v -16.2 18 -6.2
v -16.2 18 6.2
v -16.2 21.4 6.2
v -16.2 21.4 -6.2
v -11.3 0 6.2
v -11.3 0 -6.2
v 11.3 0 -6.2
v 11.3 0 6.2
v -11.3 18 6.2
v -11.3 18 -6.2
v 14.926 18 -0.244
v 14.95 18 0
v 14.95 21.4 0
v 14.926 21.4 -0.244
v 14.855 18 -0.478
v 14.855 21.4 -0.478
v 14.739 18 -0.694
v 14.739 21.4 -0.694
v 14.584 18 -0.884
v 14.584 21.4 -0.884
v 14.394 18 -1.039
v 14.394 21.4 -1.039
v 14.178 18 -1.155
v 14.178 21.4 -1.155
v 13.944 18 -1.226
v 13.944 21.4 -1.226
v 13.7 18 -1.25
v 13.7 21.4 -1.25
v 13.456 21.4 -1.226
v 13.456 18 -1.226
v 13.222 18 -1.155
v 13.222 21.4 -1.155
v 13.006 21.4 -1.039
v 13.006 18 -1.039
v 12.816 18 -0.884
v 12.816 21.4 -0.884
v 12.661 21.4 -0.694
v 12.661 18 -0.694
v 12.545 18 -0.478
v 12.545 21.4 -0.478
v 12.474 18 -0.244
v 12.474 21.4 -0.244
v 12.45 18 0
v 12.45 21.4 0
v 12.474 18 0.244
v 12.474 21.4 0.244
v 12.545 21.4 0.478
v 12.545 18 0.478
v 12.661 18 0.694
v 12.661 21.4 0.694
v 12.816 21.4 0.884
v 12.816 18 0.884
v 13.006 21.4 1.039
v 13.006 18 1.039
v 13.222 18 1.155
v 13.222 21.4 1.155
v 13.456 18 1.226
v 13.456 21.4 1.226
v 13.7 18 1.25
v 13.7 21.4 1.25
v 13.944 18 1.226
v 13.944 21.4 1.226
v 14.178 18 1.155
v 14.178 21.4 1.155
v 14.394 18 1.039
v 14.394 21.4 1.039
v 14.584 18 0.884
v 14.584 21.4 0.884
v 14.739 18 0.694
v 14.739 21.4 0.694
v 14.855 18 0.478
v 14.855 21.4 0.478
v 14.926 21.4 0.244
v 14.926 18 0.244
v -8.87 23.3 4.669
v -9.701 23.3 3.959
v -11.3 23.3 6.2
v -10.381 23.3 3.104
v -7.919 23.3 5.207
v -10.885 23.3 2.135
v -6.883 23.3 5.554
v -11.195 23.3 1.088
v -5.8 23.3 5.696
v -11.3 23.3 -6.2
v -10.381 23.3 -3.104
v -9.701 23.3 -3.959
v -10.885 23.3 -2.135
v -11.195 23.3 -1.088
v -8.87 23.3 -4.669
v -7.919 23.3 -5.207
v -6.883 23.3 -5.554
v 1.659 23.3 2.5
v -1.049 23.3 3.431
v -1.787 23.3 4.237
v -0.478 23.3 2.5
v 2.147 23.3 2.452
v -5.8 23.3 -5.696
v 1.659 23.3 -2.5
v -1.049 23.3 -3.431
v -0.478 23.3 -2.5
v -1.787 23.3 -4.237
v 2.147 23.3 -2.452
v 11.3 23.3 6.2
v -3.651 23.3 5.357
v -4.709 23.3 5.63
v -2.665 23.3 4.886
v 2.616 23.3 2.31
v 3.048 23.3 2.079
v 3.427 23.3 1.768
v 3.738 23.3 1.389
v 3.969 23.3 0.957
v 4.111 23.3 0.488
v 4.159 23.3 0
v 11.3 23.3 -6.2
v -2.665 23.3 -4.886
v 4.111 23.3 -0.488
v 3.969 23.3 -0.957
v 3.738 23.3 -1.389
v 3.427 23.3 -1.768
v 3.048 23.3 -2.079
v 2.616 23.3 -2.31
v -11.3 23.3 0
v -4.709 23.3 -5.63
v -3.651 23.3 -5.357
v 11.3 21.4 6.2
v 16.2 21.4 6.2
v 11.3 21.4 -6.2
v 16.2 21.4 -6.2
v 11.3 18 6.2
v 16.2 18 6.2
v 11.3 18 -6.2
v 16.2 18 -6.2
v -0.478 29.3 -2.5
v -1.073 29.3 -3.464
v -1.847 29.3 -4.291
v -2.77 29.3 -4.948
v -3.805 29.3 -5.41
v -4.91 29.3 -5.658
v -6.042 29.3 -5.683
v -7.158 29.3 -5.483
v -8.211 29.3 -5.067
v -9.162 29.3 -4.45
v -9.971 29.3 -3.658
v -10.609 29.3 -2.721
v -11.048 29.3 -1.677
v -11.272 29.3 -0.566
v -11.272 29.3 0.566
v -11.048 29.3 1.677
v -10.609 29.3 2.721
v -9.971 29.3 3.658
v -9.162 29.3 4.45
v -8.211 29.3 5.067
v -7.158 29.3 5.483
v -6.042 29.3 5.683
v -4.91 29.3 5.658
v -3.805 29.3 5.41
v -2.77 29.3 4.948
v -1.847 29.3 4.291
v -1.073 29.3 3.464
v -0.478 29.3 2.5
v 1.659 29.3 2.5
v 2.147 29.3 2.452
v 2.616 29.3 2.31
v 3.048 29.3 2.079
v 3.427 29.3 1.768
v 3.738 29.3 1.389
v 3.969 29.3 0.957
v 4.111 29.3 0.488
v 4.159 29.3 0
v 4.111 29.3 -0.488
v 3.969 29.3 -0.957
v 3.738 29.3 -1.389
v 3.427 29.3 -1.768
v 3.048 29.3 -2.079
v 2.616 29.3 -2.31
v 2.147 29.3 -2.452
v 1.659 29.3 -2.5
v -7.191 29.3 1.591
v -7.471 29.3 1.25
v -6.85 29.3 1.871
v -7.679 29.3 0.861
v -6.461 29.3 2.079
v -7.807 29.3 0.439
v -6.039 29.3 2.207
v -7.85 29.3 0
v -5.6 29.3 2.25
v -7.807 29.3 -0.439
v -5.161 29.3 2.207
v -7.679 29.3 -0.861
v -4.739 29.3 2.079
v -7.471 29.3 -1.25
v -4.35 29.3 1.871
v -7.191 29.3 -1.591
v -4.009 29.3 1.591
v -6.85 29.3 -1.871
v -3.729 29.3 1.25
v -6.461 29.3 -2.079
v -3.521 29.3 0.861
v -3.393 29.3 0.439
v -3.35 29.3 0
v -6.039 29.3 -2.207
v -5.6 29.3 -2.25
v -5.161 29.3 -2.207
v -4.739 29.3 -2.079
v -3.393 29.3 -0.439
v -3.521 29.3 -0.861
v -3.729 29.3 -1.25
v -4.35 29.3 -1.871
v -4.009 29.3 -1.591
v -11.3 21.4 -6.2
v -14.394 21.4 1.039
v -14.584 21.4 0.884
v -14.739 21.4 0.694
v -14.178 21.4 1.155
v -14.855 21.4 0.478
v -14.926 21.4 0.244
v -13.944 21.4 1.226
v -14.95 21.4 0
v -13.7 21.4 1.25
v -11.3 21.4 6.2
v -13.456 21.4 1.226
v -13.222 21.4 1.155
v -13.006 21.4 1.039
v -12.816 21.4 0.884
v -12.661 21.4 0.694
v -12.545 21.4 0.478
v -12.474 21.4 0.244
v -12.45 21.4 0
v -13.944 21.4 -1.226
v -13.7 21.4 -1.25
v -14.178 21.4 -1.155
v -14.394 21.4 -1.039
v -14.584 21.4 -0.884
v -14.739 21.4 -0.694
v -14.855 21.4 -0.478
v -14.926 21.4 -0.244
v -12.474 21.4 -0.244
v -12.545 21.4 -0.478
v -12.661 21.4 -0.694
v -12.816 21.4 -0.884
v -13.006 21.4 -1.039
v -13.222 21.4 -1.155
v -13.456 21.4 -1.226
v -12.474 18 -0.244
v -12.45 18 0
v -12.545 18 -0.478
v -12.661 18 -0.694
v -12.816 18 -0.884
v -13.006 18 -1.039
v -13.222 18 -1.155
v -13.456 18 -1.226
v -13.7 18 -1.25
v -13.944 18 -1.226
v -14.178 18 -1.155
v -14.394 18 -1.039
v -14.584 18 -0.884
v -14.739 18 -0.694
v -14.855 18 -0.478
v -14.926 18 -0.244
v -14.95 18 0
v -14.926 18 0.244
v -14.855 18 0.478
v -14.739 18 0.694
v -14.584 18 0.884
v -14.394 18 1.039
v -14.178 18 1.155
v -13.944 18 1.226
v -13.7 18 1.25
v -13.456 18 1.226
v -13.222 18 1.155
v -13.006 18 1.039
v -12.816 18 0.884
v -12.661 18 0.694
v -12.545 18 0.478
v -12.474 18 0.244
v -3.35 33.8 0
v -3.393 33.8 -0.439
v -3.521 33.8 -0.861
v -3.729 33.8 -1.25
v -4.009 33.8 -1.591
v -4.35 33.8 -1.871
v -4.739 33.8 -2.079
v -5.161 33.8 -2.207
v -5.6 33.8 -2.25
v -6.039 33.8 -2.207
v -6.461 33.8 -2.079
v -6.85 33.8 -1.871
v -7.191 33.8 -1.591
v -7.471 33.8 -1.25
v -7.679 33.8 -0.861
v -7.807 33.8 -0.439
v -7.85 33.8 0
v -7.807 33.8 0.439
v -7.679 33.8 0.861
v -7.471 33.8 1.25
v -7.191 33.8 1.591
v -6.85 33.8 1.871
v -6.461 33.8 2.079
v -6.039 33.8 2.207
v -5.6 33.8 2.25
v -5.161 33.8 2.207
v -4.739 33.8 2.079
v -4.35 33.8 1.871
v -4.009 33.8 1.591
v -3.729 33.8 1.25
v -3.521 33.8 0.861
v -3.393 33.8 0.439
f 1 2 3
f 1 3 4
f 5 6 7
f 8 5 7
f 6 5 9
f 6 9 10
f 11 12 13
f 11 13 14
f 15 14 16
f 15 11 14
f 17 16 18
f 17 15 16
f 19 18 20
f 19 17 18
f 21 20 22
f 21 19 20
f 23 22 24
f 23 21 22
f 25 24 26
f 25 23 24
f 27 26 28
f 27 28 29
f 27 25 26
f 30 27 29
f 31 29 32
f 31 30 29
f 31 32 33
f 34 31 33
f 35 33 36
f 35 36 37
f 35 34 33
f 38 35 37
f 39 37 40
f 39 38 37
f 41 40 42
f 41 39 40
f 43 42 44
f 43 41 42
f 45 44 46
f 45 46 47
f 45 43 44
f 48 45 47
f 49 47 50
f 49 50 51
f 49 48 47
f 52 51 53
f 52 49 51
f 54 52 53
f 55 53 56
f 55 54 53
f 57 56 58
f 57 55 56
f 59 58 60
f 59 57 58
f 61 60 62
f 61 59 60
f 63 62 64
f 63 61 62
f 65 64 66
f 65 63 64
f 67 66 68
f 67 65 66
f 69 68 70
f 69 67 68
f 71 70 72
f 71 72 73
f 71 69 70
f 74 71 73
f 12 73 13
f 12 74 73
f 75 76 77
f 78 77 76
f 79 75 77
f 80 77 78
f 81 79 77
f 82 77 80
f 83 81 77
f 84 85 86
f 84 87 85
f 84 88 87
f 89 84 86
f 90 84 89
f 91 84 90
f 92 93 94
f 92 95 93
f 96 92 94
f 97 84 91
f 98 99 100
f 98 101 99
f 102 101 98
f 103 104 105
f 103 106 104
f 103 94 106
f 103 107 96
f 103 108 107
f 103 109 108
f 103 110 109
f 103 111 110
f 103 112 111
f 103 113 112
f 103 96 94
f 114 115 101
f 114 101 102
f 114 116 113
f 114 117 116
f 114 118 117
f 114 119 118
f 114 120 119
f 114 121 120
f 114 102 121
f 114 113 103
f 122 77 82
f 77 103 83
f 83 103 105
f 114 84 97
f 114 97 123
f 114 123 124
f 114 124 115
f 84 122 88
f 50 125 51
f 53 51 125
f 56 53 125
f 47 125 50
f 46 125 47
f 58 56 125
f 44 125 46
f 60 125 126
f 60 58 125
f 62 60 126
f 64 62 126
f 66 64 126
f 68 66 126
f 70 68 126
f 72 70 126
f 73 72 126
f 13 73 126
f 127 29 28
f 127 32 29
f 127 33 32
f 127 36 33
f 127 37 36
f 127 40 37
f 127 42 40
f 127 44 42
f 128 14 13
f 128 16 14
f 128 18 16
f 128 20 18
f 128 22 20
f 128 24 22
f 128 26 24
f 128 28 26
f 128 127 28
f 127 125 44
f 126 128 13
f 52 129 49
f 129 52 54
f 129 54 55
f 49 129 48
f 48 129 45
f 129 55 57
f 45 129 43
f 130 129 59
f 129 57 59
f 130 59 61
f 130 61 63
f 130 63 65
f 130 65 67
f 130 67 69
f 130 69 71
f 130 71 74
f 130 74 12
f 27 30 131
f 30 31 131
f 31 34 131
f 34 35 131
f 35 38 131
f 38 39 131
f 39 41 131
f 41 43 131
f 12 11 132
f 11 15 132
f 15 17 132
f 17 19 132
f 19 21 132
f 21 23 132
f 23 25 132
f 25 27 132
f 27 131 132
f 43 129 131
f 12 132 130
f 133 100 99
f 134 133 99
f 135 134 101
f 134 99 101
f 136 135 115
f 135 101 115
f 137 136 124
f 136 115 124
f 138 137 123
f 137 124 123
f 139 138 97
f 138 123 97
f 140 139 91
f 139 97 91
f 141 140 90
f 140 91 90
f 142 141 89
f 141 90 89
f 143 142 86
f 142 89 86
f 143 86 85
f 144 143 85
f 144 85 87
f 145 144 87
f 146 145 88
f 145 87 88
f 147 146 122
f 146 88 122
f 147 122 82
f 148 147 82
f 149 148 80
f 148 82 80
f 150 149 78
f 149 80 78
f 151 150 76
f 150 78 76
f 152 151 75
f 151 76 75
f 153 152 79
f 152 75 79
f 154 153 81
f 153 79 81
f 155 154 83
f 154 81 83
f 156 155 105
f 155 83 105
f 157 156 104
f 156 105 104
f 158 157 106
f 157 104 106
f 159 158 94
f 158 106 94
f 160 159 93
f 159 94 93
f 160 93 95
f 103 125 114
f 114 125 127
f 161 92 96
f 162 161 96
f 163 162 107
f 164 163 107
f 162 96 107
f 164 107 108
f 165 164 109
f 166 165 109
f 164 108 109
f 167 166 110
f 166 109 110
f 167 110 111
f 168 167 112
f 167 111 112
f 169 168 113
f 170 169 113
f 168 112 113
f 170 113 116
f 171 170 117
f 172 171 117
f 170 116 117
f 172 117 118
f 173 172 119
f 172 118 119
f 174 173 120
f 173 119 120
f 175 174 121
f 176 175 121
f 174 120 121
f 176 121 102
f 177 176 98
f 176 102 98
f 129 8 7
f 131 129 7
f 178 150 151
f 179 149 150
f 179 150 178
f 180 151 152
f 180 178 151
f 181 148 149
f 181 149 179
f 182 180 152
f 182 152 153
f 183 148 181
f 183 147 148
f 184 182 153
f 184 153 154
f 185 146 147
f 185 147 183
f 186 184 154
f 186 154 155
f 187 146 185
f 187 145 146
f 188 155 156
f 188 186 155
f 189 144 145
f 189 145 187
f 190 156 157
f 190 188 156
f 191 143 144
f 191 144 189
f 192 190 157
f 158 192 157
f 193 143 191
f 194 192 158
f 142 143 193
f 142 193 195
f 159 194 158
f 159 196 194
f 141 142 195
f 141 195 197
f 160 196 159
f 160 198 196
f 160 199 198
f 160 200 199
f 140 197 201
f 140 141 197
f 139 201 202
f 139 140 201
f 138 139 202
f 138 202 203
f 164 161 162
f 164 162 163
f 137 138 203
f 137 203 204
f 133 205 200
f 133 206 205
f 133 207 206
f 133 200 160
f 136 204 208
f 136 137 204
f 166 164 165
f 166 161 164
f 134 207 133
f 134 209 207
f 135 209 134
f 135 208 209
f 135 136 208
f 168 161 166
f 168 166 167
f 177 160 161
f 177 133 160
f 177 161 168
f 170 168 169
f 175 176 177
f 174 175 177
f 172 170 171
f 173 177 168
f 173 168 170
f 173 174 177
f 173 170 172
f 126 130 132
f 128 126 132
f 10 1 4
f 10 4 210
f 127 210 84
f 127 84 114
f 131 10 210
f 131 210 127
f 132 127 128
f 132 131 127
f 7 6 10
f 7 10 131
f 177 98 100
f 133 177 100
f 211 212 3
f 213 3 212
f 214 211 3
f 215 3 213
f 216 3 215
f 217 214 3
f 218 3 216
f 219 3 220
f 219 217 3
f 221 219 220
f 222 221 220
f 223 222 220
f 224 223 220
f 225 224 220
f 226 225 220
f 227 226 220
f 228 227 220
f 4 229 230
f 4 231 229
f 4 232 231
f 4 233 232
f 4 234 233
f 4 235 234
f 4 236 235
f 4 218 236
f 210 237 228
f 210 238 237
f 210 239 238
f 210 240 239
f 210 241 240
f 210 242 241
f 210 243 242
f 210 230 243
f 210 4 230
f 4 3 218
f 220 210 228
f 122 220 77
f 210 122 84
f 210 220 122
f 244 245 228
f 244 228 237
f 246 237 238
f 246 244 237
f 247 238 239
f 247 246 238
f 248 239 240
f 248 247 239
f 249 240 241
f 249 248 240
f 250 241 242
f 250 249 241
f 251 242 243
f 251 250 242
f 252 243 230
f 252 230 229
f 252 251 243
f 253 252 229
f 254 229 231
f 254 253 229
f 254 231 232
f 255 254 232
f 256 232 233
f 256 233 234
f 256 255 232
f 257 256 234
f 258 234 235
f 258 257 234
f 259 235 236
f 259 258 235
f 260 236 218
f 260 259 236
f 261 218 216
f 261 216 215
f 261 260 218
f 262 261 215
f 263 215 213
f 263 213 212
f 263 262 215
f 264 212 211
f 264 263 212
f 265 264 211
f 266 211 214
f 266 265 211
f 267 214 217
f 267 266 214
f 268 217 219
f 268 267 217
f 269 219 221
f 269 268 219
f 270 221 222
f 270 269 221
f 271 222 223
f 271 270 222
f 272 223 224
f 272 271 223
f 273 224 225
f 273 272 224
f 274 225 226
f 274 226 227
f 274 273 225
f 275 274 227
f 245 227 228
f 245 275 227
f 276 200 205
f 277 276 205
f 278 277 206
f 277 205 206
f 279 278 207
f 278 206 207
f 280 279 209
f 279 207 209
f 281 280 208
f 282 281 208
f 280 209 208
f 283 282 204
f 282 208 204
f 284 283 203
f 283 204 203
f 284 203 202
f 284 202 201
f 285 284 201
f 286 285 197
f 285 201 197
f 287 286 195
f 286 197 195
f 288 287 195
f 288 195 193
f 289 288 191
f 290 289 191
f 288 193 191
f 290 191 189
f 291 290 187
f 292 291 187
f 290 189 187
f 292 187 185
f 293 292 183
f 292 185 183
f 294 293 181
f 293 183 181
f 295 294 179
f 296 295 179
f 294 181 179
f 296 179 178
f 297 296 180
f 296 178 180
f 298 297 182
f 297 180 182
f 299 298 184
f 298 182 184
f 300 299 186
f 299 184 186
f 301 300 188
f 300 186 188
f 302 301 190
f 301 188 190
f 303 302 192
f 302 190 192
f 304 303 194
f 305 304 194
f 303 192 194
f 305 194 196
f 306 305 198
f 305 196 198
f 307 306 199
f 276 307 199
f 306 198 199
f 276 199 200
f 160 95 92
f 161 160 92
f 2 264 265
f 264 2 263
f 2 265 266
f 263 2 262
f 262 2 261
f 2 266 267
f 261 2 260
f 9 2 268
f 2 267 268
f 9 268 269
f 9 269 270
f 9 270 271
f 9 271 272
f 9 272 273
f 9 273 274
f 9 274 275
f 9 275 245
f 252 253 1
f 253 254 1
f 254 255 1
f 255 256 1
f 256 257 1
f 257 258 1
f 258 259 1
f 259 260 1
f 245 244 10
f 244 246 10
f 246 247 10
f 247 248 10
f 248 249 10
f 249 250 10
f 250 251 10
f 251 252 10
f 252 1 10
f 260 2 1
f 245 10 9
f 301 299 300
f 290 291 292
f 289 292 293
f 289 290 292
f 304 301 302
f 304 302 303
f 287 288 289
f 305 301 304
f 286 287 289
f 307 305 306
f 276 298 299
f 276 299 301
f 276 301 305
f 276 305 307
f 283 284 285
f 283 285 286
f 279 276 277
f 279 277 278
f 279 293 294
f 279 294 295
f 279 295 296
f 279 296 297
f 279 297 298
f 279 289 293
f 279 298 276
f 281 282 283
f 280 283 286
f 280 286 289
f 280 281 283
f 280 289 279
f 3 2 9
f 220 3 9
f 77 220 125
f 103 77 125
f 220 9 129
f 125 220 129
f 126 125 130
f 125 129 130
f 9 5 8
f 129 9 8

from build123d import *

# Parameters (mm, degrees)
SKETCH_1_W      = 22.6
SKETCH_1_H      = 12.4
EXTRUDE_1_DEPTH = 18
SKETCH_2_W      = 32.4
SKETCH_2_H      = 12.4
SKETCH_2_R      = 1.25
EXTRUDE_2_DEPTH = 3.4
SKETCH_3_W      = 22.6
SKETCH_3_H      = 12.4
EXTRUDE_3_DEPTH = 1.9
EXTRUDE_4_DEPTH = 6
SKETCH_5_R      = 2.25
EXTRUDE_5_DEPTH = 4.5


with BuildPart() as part:
    # 草图1 → 凸台-拉伸1 (new body)
    with BuildSketch(Plane(origin=(0, 0, 0), x_dir=(1, 0, 0), z_dir=(0, 1, 0))):
        Rectangle(SKETCH_1_W, SKETCH_1_H)
    extrude(amount=EXTRUDE_1_DEPTH)

    # 草图2 → 凸台-拉伸2 (add)
    with BuildSketch(Plane(origin=(0, 18, 0), x_dir=(1, 0, 0), z_dir=(0, 1, 0))):
        Rectangle(SKETCH_2_W, SKETCH_2_H)
        with Locations((-13.7, 0)):
            Circle(SKETCH_2_R, mode=Mode.SUBTRACT)
        with Locations((13.7, 0)):
            Circle(SKETCH_2_R, mode=Mode.SUBTRACT)
    extrude(amount=EXTRUDE_2_DEPTH)

    # 草图3 → 凸台-拉伸3 (add)
    with BuildSketch(Plane(origin=(0, 21.4, 0), x_dir=(1, 0, 0), z_dir=(0, 1, 0))):
        Rectangle(SKETCH_3_W, SKETCH_3_H)
    extrude(amount=EXTRUDE_3_DEPTH)

    # 草图4 → 凸台-拉伸4 (add)
    with BuildSketch(Plane(origin=(0, 23.3, 0), x_dir=(1, 0, 0), z_dir=(0, 1, 0))):
        with BuildLine():
            Line((1.659485126, 2.5), (-0.47750061, 2.5))
            ThreePointArc((-0.47750061, 2.5), (-11.3, 0), (-0.47750061, -2.5))
            Line((-0.47750061, -2.5), (1.659485126, -2.5))
            ThreePointArc((1.659485126, -2.5), (4.159485126, 0), (1.659485126, 2.5))
        make_face()
    extrude(amount=EXTRUDE_4_DEPTH)

    # 草图5 → 凸台-拉伸5 (add)
    with BuildSketch(Plane(origin=(0, 29.3, 0), x_dir=(1, 0, 0), z_dir=(0, 1, 0))):
        with Locations((-5.6, 0)):
            Circle(SKETCH_5_R)
    extrude(amount=EXTRUDE_5_DEPTH)


solid = part.part
